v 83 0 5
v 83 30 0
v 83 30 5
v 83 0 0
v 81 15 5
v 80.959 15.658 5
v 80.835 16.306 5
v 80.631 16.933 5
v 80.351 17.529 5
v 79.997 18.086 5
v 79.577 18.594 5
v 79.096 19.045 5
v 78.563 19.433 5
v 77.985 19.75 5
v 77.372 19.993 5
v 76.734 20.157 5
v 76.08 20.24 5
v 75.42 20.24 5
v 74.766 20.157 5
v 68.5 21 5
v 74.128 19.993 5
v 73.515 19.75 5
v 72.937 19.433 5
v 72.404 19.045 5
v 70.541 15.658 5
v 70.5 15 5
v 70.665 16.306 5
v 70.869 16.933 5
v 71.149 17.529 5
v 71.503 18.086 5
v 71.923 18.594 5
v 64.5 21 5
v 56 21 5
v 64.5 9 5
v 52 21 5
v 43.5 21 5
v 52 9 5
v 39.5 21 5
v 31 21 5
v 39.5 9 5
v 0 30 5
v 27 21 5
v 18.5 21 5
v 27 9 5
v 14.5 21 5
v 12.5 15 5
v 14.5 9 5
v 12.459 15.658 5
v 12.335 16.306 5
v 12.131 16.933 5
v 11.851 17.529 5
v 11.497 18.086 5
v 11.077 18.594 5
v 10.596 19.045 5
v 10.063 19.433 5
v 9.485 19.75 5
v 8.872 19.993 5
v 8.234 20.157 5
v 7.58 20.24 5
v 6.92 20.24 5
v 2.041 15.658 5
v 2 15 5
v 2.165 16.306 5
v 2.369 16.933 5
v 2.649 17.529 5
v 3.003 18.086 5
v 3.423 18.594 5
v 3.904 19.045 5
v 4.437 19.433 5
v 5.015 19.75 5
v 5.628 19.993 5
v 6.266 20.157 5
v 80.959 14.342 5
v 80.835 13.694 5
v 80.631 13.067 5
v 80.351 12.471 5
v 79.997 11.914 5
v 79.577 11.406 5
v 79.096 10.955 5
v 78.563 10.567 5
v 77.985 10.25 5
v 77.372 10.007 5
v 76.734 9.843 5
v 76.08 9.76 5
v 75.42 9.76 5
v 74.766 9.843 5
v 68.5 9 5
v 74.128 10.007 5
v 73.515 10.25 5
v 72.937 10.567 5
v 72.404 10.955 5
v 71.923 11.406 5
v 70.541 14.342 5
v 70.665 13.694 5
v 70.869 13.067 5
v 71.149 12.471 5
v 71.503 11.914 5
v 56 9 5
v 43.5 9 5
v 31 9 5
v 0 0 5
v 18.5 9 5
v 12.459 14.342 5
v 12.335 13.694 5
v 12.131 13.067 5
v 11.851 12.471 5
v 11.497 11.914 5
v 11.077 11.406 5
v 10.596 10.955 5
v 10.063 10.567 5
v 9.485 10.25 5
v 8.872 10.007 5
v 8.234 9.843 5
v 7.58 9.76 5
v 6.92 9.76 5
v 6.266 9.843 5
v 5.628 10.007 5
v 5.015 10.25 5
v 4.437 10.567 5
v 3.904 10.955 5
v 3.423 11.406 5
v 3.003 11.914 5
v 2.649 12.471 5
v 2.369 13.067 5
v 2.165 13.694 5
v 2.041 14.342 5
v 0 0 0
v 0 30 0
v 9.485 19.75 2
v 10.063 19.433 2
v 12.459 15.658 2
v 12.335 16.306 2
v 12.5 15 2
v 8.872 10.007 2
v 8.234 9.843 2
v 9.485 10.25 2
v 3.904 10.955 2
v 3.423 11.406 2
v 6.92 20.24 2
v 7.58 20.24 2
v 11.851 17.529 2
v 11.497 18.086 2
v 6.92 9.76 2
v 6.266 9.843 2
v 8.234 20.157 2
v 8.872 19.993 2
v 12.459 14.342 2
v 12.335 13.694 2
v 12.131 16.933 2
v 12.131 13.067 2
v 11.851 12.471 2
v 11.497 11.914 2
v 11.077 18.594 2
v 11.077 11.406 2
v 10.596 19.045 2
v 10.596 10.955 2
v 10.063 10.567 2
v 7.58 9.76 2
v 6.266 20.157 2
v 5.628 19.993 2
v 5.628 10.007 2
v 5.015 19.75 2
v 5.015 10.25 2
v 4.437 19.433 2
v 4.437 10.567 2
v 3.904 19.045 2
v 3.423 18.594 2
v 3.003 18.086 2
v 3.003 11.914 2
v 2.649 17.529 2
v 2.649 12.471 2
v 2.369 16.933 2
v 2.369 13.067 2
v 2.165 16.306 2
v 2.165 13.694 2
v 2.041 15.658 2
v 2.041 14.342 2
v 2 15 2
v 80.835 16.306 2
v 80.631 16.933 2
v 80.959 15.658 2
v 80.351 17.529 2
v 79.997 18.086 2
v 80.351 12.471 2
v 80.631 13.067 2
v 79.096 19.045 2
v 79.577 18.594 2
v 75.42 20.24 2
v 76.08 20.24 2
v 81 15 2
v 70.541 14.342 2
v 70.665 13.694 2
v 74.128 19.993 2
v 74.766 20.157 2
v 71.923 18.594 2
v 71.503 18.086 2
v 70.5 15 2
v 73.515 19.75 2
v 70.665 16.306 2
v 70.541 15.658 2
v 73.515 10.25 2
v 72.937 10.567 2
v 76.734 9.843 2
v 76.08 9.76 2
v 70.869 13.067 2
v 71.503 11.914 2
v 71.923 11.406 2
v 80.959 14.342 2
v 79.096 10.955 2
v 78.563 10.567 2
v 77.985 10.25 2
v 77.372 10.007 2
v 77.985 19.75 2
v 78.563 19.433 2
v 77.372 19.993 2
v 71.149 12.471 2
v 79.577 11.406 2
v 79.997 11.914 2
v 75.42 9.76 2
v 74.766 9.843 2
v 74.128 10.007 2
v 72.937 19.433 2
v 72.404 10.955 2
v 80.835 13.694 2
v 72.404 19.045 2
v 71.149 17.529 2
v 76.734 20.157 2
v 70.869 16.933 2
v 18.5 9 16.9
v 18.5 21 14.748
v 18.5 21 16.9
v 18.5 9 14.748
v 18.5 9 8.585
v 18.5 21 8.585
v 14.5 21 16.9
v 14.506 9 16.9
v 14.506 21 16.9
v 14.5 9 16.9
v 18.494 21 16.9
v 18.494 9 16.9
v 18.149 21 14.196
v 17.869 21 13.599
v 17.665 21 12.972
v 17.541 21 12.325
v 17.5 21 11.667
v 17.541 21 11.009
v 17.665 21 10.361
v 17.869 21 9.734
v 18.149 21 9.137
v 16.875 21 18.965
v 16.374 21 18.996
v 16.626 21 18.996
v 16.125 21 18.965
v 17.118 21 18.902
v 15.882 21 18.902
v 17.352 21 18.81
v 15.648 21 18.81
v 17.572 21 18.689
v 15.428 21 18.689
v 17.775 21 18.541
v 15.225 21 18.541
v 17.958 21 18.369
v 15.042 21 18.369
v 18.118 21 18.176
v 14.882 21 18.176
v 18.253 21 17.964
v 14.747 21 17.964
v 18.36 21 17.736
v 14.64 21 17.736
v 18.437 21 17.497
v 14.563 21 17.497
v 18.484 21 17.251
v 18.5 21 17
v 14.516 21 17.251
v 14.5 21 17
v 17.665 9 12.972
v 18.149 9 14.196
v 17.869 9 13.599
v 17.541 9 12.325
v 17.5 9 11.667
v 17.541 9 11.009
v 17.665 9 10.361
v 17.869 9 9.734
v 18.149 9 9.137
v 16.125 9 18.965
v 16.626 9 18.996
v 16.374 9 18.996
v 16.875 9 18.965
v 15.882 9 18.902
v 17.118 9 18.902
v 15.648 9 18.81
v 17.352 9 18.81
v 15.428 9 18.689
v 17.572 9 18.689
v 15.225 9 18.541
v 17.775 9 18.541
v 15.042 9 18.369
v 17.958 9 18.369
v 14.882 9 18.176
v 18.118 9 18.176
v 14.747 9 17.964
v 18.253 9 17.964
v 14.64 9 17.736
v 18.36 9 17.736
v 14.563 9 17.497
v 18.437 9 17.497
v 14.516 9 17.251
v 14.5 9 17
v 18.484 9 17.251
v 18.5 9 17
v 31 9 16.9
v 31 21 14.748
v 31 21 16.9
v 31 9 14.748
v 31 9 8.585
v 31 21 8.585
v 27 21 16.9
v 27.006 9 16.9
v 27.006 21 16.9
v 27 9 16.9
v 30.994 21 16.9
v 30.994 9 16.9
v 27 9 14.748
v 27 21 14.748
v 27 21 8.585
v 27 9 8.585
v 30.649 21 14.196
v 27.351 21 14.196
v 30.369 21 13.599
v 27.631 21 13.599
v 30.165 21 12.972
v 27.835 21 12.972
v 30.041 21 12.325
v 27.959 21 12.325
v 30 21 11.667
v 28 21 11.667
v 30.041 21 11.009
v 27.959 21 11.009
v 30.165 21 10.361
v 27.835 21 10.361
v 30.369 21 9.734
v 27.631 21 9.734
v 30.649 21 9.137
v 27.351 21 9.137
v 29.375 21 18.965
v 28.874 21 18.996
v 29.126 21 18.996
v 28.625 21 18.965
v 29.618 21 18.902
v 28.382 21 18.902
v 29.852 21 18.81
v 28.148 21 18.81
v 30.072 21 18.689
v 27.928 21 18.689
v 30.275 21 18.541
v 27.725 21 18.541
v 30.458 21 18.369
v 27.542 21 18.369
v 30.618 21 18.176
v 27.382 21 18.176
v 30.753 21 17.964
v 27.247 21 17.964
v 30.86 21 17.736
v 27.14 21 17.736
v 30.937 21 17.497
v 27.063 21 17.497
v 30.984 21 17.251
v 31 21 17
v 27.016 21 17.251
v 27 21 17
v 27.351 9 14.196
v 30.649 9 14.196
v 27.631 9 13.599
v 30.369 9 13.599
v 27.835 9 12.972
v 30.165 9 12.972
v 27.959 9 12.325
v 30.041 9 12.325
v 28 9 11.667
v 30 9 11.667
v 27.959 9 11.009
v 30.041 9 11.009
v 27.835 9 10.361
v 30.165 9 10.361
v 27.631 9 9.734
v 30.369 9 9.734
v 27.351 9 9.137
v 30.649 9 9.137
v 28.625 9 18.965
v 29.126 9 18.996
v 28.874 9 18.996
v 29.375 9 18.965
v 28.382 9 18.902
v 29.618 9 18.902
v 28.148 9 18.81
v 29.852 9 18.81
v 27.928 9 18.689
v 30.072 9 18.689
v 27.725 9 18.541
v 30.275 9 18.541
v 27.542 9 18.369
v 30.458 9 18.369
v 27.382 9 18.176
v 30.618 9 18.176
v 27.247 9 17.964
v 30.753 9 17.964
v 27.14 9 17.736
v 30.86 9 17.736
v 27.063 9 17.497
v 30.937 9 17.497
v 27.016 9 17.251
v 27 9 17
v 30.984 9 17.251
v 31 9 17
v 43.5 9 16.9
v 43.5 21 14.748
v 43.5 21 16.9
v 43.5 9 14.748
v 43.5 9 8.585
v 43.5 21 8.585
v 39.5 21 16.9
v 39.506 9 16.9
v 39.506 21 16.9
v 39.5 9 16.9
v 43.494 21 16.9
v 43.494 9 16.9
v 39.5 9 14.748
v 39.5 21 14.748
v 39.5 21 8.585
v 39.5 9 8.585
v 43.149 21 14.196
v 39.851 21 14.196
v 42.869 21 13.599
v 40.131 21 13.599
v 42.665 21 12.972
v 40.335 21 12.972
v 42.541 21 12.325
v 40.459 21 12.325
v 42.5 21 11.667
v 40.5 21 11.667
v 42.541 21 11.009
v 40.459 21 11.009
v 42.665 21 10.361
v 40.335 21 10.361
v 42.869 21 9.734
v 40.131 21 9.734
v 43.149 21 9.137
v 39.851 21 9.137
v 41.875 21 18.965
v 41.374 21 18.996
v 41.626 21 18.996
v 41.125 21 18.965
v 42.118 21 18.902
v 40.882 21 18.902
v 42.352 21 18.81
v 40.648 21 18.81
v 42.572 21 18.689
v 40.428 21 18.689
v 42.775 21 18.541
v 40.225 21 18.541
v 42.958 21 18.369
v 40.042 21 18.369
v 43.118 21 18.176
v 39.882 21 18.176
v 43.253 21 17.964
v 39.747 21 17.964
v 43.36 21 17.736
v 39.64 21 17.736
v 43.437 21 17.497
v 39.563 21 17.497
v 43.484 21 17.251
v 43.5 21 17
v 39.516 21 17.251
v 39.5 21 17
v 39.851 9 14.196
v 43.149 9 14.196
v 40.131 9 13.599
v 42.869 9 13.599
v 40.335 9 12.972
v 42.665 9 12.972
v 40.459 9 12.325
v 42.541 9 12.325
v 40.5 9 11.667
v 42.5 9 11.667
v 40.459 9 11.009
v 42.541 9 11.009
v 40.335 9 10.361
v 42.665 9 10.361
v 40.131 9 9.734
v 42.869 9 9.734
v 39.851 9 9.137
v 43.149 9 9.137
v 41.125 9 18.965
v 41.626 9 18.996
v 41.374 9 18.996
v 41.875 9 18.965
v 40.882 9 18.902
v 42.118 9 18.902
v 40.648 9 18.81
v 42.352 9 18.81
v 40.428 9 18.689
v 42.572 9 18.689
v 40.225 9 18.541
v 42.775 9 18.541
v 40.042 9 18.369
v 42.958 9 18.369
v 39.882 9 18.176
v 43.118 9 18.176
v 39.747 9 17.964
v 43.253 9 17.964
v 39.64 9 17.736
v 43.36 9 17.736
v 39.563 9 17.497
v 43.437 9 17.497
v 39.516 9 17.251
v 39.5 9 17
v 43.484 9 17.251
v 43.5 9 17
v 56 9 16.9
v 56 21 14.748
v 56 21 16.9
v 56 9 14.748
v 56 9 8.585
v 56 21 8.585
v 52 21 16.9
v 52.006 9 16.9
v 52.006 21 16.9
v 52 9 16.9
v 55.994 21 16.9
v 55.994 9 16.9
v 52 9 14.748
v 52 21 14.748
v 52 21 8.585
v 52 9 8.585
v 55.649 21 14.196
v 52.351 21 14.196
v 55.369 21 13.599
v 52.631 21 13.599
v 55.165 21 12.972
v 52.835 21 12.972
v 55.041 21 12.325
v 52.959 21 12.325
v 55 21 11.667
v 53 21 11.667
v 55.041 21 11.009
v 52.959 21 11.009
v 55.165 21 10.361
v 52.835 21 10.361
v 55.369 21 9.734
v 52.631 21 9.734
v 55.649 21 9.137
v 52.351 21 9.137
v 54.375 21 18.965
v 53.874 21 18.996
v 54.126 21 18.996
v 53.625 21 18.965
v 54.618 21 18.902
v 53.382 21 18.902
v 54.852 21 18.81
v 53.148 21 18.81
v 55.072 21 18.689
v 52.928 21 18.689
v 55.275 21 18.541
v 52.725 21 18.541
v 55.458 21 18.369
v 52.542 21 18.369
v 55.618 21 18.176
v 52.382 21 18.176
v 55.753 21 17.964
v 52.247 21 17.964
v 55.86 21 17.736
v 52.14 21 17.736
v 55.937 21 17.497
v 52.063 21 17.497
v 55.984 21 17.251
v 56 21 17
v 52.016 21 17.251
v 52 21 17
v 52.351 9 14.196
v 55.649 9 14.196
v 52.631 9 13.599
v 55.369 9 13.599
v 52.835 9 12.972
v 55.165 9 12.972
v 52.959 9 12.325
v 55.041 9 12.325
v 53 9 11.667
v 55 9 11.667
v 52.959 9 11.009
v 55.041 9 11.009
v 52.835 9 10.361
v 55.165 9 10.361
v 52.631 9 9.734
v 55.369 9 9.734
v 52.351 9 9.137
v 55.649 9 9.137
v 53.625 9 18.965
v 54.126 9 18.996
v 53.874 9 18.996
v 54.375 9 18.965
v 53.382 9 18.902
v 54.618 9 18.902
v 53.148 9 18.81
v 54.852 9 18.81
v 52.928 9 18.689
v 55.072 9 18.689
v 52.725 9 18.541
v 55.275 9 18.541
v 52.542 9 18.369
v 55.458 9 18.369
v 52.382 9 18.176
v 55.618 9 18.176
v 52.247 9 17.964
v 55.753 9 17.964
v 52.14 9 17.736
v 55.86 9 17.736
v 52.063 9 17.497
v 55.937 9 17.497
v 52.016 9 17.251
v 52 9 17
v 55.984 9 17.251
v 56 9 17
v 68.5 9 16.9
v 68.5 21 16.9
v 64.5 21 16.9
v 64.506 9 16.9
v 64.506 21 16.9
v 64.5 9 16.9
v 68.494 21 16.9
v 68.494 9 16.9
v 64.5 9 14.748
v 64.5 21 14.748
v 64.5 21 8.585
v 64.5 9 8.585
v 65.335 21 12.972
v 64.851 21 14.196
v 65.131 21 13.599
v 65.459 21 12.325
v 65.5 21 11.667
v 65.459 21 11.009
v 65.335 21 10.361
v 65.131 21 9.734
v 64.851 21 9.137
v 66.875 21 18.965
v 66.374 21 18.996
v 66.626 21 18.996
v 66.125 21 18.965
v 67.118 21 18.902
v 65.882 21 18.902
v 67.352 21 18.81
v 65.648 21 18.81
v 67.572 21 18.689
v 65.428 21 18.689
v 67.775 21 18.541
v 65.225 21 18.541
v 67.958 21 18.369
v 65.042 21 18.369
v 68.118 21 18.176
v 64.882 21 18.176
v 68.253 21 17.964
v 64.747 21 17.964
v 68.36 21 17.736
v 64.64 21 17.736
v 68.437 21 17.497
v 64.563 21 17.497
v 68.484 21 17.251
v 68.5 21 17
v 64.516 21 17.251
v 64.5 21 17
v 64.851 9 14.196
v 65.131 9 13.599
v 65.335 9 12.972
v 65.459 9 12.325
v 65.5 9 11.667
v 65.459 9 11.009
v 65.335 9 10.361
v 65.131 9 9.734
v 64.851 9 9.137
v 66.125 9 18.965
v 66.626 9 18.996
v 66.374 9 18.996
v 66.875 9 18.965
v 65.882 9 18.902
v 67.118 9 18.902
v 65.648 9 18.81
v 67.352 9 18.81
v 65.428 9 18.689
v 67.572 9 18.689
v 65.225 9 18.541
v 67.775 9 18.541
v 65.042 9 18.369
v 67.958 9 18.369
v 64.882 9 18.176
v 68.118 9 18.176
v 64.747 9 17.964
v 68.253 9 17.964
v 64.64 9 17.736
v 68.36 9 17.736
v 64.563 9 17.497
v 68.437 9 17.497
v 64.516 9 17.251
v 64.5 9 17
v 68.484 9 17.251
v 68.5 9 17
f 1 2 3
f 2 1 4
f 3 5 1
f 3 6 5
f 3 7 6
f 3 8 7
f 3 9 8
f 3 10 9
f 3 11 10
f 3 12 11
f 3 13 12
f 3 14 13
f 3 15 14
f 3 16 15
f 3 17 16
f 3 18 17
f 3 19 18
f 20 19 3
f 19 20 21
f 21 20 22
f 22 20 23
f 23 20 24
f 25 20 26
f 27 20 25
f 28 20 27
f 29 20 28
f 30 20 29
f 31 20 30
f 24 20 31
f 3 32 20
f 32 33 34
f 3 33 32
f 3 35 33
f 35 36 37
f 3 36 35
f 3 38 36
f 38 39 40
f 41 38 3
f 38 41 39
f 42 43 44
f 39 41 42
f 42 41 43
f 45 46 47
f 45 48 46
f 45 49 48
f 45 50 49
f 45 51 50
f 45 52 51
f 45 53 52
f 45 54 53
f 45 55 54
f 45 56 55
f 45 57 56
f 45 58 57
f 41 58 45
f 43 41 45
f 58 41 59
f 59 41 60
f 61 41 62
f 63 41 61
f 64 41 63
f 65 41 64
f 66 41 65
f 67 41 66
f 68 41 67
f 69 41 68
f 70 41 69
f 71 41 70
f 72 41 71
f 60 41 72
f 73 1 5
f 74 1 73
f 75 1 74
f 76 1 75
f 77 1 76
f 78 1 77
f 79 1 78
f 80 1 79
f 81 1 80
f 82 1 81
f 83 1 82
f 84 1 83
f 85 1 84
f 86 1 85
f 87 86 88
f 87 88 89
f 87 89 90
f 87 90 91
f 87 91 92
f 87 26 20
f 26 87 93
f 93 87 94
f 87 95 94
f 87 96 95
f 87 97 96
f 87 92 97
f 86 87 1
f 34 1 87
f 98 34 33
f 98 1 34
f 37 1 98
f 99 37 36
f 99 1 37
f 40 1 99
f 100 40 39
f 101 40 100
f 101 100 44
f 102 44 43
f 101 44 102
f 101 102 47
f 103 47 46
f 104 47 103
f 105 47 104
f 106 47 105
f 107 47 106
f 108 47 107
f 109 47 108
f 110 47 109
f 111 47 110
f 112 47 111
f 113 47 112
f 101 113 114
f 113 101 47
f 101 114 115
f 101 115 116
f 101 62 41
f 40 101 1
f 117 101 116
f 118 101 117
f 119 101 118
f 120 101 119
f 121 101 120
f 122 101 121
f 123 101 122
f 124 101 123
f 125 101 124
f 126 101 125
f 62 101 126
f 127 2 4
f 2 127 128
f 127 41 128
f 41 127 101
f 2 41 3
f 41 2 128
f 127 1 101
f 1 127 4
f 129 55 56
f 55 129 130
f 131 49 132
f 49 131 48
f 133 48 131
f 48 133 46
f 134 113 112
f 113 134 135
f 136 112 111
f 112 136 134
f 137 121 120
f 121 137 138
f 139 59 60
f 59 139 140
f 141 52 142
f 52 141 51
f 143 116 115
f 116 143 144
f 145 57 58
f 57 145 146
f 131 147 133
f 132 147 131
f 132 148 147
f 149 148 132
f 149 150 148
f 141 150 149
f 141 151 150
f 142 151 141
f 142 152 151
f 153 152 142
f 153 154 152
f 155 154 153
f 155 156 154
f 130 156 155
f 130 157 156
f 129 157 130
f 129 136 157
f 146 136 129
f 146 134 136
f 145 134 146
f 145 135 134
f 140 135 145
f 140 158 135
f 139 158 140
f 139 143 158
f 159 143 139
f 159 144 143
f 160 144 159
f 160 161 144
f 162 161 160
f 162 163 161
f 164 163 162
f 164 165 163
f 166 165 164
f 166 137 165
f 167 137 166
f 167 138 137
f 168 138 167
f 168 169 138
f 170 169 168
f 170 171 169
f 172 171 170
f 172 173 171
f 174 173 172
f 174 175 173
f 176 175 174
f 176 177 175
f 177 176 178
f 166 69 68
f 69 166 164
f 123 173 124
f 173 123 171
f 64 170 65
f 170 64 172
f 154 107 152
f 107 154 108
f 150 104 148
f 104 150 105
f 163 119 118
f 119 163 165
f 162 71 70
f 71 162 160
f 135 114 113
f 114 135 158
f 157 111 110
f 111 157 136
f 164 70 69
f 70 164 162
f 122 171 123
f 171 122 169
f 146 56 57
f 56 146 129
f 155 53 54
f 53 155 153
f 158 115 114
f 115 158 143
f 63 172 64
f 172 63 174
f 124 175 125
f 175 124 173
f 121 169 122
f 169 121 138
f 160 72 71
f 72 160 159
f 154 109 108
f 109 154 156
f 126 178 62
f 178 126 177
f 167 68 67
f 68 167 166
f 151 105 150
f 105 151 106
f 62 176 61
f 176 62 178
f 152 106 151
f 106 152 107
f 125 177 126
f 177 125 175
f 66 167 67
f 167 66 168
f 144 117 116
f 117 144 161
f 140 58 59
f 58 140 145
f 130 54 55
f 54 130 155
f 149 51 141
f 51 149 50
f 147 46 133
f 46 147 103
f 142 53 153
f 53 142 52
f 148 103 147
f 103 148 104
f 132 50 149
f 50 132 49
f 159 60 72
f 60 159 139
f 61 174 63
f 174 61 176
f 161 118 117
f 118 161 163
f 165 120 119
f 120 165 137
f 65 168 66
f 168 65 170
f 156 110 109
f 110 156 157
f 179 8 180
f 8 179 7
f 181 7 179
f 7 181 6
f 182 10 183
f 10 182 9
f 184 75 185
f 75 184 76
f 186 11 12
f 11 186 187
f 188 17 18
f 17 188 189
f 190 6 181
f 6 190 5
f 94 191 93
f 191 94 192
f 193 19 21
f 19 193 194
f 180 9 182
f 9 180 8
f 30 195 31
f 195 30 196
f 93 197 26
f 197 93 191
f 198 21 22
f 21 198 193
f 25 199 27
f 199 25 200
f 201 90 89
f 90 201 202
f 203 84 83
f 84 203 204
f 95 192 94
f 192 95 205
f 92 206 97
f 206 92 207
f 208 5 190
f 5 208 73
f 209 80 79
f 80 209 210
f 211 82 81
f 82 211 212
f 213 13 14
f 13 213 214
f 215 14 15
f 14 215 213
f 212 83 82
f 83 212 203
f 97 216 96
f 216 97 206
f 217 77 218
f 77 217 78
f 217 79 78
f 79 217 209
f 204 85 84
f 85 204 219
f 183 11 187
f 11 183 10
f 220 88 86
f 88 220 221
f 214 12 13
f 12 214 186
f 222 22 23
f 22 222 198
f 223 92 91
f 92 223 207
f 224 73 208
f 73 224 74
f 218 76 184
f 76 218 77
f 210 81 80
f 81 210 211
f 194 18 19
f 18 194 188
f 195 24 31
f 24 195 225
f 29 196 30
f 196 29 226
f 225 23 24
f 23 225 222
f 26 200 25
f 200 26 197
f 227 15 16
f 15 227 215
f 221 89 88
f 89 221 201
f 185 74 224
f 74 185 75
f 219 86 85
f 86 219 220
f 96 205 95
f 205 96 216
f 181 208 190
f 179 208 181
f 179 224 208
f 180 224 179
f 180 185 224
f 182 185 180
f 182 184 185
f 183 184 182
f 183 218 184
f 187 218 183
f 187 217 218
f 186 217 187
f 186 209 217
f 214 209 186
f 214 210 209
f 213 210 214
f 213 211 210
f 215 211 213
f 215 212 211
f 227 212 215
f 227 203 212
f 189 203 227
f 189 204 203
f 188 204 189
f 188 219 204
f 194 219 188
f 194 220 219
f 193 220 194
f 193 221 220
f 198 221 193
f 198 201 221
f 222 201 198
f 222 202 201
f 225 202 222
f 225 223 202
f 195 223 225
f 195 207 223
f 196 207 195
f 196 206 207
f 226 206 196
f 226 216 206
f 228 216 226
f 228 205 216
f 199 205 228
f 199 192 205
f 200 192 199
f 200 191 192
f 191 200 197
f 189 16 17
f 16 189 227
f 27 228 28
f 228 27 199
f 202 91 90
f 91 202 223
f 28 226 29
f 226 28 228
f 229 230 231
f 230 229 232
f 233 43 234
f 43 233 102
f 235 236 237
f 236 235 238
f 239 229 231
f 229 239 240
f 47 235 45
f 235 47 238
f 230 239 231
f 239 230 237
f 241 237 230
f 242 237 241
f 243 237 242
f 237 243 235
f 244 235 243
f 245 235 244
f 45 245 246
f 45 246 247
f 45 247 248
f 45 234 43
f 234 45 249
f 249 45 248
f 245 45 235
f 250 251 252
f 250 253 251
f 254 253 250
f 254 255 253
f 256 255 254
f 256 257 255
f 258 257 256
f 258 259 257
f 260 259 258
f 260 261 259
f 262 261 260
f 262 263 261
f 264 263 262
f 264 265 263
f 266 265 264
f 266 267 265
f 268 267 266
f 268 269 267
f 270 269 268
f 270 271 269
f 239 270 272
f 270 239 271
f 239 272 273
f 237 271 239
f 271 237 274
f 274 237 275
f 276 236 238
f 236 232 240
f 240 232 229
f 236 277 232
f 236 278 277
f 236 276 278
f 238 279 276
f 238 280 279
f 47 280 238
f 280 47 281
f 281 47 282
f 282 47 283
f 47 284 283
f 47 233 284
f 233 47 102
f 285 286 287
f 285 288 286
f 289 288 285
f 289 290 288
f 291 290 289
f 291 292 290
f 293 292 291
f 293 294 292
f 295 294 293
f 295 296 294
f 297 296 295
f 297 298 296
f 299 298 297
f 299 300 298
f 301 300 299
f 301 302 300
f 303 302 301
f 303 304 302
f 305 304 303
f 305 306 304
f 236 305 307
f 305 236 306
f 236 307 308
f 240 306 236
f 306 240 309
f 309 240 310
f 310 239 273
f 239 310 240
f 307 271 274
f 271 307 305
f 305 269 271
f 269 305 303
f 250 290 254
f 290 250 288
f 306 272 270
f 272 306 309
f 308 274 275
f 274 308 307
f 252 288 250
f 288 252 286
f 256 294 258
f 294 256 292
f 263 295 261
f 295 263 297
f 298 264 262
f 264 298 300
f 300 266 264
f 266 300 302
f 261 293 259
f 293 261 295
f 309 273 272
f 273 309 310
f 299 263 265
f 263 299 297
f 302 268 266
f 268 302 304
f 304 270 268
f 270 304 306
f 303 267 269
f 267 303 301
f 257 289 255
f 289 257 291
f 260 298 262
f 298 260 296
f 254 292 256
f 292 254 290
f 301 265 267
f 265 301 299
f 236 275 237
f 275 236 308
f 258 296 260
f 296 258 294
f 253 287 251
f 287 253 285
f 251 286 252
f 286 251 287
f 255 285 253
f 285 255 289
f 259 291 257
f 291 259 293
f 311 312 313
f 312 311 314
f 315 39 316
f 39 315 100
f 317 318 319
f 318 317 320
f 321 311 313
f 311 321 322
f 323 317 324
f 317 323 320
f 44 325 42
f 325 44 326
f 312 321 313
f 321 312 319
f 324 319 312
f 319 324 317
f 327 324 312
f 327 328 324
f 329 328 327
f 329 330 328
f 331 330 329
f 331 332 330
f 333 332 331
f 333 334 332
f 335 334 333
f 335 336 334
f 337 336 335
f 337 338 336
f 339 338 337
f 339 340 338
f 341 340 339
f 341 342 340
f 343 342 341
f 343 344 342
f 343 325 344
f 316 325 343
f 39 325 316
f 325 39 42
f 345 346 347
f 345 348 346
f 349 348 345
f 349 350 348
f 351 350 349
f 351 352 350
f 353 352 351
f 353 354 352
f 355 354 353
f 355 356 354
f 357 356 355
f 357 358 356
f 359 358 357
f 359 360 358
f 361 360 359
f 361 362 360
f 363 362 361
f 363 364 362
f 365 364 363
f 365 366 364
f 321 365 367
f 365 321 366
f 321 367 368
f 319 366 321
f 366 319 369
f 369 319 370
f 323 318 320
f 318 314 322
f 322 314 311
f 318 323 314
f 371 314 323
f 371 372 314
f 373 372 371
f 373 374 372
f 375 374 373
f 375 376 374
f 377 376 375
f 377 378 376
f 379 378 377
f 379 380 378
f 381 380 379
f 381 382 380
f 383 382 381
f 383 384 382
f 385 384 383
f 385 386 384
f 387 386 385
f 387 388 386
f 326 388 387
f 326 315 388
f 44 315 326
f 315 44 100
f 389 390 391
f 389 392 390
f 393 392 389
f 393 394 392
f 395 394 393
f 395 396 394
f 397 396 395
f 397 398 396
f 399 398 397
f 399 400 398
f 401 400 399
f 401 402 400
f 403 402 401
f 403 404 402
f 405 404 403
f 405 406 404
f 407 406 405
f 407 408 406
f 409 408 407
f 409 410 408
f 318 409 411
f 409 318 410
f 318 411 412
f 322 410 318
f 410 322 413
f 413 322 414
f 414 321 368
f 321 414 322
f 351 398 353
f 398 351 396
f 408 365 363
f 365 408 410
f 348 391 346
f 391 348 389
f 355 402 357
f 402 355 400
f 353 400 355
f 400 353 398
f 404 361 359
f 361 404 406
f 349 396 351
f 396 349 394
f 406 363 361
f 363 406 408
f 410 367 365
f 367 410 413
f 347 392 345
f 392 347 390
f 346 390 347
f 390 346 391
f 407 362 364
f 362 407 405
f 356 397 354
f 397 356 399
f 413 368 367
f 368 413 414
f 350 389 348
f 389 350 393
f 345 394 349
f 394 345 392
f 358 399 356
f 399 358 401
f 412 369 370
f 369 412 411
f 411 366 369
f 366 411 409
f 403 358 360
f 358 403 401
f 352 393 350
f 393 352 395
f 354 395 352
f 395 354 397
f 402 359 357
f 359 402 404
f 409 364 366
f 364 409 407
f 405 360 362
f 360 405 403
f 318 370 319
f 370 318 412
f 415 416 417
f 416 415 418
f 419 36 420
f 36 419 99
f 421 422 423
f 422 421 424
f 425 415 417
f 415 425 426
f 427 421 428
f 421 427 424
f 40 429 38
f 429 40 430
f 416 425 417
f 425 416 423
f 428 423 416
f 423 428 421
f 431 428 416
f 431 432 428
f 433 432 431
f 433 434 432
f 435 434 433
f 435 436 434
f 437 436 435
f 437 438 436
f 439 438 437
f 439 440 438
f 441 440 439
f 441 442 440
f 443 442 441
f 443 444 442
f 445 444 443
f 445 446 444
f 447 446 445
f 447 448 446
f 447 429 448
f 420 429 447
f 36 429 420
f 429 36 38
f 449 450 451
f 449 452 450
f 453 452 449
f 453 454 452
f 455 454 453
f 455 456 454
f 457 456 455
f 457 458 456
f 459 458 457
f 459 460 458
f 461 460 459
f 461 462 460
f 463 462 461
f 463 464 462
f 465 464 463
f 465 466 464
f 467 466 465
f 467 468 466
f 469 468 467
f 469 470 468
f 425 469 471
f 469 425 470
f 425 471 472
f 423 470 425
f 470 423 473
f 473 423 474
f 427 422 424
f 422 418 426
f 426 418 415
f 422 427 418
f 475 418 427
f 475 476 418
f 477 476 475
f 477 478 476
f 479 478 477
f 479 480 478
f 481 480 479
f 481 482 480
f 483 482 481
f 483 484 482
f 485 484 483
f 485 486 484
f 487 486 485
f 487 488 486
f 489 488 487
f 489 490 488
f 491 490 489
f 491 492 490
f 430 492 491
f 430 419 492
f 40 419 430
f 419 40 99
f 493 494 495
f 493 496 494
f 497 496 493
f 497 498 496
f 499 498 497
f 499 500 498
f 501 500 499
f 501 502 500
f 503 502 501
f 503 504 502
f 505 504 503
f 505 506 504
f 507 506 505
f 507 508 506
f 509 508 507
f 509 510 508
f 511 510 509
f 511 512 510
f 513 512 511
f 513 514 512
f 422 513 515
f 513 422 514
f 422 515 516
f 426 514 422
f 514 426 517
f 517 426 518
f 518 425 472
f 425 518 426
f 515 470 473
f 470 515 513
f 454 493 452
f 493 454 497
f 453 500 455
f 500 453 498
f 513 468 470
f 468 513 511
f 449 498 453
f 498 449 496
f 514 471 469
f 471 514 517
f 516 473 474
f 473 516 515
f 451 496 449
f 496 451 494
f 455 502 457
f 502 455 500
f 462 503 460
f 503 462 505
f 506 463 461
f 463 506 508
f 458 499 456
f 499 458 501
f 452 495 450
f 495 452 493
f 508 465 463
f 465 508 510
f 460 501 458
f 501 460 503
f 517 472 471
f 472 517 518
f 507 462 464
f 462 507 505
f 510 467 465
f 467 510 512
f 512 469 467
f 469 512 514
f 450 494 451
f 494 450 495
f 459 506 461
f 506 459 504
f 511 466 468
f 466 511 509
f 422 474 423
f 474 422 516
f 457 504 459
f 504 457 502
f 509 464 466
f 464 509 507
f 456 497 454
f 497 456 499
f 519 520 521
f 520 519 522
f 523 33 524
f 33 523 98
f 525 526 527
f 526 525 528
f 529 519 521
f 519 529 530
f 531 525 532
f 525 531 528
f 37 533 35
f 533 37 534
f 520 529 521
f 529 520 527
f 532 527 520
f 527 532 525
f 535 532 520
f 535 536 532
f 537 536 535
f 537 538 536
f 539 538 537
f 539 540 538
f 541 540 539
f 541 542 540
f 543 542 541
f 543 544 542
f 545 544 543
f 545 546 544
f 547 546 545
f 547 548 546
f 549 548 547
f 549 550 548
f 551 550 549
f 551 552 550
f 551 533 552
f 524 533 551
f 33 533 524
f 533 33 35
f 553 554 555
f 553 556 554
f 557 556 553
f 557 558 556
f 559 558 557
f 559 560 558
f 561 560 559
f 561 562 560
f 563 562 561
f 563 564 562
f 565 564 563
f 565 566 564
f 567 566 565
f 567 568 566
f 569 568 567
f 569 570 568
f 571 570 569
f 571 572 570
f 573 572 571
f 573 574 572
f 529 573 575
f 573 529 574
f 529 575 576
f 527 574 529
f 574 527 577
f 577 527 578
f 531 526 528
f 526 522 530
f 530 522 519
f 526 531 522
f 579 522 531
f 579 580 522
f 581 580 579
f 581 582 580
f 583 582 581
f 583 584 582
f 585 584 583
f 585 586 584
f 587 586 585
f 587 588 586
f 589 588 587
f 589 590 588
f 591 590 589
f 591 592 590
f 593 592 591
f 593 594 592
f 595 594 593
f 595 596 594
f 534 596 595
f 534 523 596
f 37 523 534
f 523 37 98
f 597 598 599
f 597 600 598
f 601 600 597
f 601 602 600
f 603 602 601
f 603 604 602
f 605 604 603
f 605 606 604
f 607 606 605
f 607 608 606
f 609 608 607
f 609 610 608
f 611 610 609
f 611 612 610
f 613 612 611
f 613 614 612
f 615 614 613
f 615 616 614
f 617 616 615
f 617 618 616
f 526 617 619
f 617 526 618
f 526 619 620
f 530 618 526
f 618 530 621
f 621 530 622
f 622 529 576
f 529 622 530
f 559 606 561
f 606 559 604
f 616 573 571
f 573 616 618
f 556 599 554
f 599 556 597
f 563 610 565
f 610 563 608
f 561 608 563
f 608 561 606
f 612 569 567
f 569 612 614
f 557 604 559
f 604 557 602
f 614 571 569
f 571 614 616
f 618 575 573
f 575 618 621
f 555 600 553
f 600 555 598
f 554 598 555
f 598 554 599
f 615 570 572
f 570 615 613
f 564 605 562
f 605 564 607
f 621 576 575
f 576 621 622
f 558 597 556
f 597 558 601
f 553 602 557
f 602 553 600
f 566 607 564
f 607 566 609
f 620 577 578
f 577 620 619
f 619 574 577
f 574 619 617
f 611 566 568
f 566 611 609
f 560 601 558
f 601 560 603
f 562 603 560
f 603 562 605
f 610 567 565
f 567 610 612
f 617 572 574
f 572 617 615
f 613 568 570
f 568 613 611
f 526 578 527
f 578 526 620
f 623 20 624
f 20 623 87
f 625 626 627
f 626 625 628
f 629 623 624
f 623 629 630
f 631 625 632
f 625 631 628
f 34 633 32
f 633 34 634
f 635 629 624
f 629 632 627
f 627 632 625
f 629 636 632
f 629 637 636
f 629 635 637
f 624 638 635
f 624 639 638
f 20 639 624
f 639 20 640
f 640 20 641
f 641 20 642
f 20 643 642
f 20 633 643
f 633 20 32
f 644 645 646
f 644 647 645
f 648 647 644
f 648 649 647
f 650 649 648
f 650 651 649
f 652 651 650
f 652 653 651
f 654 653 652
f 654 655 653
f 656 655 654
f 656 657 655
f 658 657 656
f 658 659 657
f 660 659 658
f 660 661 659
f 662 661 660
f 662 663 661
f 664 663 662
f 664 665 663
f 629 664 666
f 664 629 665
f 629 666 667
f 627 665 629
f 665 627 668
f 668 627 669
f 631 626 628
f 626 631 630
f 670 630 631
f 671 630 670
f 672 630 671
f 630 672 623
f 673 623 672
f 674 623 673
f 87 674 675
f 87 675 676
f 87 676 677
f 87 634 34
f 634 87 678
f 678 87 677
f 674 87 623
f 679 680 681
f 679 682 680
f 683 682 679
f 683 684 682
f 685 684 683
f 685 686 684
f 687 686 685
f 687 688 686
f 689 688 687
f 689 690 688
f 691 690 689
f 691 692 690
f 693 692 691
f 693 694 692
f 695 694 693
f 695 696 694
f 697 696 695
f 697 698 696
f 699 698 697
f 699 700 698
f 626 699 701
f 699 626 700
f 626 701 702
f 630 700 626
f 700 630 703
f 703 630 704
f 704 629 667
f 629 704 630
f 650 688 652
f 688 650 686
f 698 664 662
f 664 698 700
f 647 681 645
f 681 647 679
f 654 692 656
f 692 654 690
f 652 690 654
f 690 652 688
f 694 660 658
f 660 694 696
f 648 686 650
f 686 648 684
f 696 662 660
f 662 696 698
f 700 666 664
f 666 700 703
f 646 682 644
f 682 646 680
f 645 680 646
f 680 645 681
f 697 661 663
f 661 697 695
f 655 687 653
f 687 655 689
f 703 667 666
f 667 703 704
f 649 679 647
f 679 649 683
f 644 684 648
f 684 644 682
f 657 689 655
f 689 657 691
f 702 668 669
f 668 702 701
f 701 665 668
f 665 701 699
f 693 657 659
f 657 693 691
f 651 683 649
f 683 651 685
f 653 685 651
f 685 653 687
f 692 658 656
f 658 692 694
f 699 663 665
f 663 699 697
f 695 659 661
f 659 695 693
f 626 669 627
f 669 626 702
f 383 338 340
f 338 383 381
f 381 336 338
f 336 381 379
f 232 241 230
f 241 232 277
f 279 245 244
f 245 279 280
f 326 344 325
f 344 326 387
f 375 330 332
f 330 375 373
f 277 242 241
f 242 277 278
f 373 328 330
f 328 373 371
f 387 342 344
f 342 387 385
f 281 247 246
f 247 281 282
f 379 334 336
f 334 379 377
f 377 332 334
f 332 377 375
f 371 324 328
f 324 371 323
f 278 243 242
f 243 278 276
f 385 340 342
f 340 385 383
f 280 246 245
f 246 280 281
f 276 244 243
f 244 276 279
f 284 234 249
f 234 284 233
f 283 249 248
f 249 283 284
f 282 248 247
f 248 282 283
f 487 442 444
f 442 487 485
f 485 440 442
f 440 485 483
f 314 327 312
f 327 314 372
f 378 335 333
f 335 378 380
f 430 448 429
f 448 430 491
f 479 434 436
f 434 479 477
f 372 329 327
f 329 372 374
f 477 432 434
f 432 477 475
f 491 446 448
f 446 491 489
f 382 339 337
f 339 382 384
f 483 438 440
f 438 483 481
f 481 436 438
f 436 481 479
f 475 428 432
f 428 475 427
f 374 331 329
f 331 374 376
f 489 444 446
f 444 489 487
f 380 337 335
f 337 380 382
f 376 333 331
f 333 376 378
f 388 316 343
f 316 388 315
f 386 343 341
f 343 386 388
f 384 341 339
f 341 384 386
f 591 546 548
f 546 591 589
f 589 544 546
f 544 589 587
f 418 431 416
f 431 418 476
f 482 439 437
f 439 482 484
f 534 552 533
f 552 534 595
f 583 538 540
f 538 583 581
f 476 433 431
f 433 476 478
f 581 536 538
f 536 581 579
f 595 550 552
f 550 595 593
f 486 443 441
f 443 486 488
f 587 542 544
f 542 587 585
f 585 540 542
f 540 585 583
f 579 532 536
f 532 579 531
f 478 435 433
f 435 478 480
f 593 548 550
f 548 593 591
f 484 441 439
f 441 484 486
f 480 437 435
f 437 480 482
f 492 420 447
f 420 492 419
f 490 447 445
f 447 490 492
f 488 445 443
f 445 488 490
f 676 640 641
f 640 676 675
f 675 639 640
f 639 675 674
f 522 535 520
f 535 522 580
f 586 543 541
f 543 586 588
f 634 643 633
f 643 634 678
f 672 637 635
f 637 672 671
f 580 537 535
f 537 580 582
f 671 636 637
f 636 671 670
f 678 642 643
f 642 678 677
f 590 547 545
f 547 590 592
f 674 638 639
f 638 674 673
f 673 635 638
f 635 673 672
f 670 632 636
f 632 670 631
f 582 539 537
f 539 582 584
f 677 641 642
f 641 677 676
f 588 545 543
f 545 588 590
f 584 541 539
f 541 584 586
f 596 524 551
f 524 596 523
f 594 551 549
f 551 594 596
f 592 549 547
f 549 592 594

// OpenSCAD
/* [Holder] */
// Holder hight
holder_height = 30;
// Holder width
holder_width = 5;

/* [Magnets] */
// Magnet diameter
magnet_d = 10.5; // Diameter
// Magnet distance from border and adjacent pen support
magnet_distance = 2;

/* [Pens holders] */
// Pen holder height
pen_holder_height = 12;
// Pen holder width
pen_holder_width = 4;

/* [Pens] */
// Pen diameter (larger to allow insert in the holder)
pen_d = 10.5;
// Nick size to hold pen in support
pen_inside = 1;
// Pen number
pen_number = 4;

/* [Hidden] */
magnet_r = magnet_d/2;

pen_r = pen_d / 2;

offcet_base = magnet_d + magnet_distance * 2;
offcet_holder = offcet_base;
offcet_pen = offcet_base + pen_holder_width - pen_inside;

holder_length = offcet_base + pen_holder_width*(pen_number+1) + pen_d*pen_number - pen_inside*pen_number*2 + magnet_d + magnet_distance*2;

$fn = 50;

difference() {
    union() {
        difference() {
            cube([holder_length, holder_height, holder_width]);
            magnet(0);
            translate([0, 0, 0])
                magnet(offcet_base + pen_holder_width*(pen_number+1) + pen_d*pen_number - pen_inside*pen_number*2);
            }
        for (i=[0:pen_number]) {
            pen_holder(offcet_holder + pen_holder_width*i + pen_d*i - pen_inside*i*2);
        }        
    }
    for (i=[0:pen_number-1]) {
        pen(offcet_pen + pen_d*i + pen_holder_width*i - pen_inside*i*2);
    }
}

module magnet(shift) {
    translate([shift + magnet_r + magnet_distance, holder_height/2, magnet_distance])
        cylinder(holder_width, r=magnet_r);
}

module pen_holder(shift) {
    union() {
        translate([shift, (holder_height-pen_holder_height)/2, holder_width-0.1])
            cube([pen_holder_width, pen_holder_height, pen_holder_height]);
        translate([shift+pen_holder_width/2, (holder_height-pen_holder_height)/2,    holder_width+pen_holder_height])
            rotate([-90, 0, 0])
                cylinder(pen_holder_height, r=pen_holder_width/2);
    }
}

module pen(shift) {
    translate([shift + pen_r, 0, holder_width+pen_holder_height/1.8])
        rotate([-90, 0, 0])
            cylinder(holder_height, r=pen_r);
}
